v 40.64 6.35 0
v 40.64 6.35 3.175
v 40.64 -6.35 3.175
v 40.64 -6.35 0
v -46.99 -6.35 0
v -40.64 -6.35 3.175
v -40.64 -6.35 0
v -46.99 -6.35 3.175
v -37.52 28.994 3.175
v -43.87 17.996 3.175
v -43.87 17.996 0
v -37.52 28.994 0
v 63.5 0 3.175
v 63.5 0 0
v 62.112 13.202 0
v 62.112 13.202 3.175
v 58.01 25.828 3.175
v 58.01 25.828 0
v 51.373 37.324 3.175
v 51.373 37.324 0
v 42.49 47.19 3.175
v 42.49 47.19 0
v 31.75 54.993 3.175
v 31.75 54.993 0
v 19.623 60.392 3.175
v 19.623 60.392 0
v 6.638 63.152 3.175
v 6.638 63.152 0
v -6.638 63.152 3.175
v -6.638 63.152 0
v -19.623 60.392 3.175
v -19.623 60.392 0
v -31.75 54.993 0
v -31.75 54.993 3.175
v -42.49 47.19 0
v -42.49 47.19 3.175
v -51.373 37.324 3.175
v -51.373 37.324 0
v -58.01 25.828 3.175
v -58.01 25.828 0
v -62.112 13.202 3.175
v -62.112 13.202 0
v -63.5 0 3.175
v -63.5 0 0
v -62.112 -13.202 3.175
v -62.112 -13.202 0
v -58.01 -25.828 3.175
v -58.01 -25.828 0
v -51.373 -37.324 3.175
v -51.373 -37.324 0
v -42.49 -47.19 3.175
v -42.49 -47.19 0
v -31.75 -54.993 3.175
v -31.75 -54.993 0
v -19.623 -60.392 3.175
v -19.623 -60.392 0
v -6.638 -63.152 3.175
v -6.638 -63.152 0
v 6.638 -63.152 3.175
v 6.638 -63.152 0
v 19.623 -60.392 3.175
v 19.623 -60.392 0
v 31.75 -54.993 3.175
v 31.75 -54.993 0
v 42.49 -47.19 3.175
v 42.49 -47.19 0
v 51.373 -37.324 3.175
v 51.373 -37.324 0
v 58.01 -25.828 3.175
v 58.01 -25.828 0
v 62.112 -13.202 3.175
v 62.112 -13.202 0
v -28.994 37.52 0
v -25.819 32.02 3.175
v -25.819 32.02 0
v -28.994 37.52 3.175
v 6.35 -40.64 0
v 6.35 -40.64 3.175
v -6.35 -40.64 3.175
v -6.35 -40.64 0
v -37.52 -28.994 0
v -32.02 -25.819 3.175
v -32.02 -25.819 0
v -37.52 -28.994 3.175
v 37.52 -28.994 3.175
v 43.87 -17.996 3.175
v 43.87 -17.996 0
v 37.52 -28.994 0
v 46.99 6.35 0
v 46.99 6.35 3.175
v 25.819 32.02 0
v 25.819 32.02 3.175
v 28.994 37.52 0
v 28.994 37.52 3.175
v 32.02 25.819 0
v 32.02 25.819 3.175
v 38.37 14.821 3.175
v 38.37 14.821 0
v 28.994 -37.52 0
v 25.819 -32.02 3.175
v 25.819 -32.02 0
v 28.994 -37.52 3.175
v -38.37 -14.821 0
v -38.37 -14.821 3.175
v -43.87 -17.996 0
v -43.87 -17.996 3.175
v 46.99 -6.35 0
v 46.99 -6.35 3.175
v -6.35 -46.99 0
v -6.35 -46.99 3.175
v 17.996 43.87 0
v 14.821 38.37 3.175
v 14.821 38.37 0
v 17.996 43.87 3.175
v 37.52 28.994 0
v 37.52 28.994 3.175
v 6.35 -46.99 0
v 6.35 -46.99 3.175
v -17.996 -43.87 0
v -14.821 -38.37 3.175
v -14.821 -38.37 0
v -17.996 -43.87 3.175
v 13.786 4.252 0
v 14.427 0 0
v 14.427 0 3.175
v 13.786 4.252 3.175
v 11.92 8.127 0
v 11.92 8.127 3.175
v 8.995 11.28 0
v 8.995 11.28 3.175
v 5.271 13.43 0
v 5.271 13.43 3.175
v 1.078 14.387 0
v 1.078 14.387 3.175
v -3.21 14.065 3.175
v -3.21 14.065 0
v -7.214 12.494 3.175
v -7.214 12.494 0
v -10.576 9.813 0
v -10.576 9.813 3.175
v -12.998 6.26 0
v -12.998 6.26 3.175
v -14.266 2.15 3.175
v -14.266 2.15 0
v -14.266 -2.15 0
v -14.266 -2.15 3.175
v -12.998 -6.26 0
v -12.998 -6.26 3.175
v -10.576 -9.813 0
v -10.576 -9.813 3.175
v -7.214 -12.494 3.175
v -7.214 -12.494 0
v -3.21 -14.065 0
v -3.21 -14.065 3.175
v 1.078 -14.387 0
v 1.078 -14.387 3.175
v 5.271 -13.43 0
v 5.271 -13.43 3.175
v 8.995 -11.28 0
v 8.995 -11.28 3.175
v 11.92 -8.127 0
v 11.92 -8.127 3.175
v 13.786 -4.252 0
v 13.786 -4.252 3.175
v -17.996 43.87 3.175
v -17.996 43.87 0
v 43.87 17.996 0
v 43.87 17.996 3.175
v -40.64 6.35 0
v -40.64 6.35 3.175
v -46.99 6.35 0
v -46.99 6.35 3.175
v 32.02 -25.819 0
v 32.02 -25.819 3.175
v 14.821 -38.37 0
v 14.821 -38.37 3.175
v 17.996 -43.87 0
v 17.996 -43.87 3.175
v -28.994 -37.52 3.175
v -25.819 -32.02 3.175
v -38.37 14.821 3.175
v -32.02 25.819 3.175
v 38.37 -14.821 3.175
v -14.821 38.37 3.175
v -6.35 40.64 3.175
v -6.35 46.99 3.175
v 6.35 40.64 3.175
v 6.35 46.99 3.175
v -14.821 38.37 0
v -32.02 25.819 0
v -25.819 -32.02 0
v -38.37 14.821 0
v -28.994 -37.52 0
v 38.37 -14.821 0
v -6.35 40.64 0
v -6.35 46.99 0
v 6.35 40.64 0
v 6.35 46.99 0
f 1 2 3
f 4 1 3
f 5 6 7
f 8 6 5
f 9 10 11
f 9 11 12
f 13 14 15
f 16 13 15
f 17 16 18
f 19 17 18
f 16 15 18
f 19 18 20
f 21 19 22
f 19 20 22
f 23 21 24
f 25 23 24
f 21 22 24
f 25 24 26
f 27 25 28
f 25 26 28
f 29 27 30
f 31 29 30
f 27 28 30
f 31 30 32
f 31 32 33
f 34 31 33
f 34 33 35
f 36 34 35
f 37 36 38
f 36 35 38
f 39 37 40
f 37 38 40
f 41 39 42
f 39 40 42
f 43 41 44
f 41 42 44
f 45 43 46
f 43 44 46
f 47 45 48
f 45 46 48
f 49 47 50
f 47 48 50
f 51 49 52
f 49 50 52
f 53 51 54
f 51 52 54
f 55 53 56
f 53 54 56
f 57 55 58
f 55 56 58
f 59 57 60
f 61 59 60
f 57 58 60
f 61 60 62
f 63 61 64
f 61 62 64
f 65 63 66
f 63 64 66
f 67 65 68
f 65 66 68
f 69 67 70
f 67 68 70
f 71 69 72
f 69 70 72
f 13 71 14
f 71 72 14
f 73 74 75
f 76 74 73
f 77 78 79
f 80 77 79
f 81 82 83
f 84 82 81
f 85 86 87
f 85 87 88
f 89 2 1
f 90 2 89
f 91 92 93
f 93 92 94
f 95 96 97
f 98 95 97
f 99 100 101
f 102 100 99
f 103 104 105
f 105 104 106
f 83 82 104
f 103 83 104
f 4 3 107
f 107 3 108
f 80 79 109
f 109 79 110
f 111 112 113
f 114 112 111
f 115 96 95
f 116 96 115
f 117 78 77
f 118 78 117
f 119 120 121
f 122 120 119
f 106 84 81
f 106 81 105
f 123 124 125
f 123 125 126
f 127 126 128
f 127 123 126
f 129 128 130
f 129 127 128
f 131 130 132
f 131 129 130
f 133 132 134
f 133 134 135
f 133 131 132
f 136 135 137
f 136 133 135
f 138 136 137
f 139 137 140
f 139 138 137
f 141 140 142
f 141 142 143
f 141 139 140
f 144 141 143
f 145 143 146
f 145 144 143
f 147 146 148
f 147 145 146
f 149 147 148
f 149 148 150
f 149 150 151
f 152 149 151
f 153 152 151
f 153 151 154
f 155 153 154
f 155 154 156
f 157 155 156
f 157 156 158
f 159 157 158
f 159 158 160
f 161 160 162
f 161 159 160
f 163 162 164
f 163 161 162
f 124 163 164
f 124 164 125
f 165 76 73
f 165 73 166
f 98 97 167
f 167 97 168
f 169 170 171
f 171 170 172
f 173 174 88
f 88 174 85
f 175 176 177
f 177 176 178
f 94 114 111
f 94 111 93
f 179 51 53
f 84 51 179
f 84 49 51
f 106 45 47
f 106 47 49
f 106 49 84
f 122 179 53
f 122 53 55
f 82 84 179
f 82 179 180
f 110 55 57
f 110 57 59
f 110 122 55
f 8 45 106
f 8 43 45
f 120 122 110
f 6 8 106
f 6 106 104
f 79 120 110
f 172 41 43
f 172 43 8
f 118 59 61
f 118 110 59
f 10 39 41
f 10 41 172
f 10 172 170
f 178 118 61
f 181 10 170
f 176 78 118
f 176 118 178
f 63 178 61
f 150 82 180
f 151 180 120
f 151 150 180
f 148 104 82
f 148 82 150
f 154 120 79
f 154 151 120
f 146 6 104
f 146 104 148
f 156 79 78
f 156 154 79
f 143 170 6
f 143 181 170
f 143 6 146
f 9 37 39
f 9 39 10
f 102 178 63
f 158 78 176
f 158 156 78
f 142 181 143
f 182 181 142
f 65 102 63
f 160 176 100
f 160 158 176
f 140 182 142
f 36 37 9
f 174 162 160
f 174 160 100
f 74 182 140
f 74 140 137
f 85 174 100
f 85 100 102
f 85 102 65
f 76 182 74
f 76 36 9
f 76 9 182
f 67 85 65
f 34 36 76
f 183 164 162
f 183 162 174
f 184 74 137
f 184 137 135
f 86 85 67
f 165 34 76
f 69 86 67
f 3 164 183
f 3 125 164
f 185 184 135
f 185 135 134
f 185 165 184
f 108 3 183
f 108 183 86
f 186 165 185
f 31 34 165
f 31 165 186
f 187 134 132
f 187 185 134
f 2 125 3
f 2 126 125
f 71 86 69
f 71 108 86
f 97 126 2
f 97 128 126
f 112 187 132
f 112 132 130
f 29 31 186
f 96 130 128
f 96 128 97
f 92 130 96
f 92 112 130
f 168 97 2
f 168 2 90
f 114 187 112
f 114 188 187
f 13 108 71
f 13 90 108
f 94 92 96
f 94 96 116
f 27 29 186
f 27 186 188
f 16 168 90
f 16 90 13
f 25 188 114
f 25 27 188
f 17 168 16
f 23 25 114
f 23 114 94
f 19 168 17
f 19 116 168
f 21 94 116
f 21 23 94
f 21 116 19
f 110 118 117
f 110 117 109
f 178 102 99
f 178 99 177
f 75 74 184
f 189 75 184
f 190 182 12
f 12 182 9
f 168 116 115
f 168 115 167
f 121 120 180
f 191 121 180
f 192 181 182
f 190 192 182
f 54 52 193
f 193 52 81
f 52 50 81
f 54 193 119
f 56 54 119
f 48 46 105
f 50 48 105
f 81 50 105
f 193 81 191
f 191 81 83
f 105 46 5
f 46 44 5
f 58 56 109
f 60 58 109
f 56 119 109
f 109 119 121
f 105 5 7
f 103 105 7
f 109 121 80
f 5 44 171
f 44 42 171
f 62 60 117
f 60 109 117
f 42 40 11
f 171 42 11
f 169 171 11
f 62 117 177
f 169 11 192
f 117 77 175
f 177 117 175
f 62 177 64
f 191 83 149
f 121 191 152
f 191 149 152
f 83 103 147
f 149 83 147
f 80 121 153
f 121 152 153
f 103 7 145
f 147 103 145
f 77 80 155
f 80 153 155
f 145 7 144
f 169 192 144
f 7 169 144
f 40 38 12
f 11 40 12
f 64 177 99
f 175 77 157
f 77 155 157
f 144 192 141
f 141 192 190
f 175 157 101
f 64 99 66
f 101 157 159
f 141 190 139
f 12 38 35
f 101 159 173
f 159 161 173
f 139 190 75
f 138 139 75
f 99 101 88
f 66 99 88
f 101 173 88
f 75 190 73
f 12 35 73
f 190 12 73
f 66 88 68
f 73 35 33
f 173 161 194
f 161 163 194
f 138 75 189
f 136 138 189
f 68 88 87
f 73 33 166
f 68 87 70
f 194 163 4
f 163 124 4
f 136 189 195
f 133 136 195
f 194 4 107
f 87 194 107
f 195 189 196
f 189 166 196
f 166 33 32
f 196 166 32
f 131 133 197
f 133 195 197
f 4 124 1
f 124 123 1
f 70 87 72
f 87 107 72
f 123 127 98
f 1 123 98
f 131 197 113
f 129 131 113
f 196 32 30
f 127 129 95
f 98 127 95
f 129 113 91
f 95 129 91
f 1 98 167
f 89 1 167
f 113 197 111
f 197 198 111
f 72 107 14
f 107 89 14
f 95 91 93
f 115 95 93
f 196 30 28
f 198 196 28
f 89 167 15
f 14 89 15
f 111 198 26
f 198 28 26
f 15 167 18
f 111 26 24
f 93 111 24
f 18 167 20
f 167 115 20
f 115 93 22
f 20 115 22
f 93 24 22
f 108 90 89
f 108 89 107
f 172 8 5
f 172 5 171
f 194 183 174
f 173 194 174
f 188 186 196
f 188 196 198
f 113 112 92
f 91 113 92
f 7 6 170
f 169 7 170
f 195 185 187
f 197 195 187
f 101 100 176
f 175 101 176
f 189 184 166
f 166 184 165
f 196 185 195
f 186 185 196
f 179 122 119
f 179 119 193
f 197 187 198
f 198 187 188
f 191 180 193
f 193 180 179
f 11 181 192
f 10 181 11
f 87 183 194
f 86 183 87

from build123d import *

# Parameters (mm, degrees)
F0_R            = 63.5
F0_R_2          = 14.4272
F1_DEPTH        = 3.175
F2_W            = 12.7
F2_H            = 6.35
F3_DEPTH        = 3.176
F3_COPIES_COUNT = 12
F4_R            = 2.4892
F5_DEPTH        = 182


# Not quite as in the source:
# - an extrude ends at something that could not be found from the text; its depth is read off the source's solid
# - a pattern or mirror of a feature is missing from the dataset's text; its kind, count and spacing are read off the source's solid


with BuildPart() as f1:
    # F0 (on Top) → F1 (new body)
    with BuildSketch(Plane.XY):
        Circle(F0_R)
        Circle(F0_R_2, mode=Mode.SUBTRACT)
    extrude(amount=F1_DEPTH)

    # F2 (on face) → F3 (cut, through all)
    with BuildSketch(Plane.XY.offset(3.175)):
        with Locations((0, 43.815)):
            Rectangle(F2_W, F2_H)
    f3 = extrude(amount=-F3_DEPTH, mode=Mode.SUBTRACT)

    # F3_copies: F3 ×12 about axis
    f3_copies_axis = Axis((0, 0, 0), (0, 0, 1))
    for i in range(1, F3_COPIES_COUNT):
        add(f3.rotate(f3_copies_axis, i * 360 / F3_COPIES_COUNT), mode=Mode.SUBTRACT)

    # F4 (on Top) → F5 (cut, through all)
    with BuildSketch(Plane.XY):
        with Locations((0, 23.8125)):
            Circle(F4_R)
    extrude(amount=-F5_DEPTH, mode=Mode.SUBTRACT)


solid = f1.part
